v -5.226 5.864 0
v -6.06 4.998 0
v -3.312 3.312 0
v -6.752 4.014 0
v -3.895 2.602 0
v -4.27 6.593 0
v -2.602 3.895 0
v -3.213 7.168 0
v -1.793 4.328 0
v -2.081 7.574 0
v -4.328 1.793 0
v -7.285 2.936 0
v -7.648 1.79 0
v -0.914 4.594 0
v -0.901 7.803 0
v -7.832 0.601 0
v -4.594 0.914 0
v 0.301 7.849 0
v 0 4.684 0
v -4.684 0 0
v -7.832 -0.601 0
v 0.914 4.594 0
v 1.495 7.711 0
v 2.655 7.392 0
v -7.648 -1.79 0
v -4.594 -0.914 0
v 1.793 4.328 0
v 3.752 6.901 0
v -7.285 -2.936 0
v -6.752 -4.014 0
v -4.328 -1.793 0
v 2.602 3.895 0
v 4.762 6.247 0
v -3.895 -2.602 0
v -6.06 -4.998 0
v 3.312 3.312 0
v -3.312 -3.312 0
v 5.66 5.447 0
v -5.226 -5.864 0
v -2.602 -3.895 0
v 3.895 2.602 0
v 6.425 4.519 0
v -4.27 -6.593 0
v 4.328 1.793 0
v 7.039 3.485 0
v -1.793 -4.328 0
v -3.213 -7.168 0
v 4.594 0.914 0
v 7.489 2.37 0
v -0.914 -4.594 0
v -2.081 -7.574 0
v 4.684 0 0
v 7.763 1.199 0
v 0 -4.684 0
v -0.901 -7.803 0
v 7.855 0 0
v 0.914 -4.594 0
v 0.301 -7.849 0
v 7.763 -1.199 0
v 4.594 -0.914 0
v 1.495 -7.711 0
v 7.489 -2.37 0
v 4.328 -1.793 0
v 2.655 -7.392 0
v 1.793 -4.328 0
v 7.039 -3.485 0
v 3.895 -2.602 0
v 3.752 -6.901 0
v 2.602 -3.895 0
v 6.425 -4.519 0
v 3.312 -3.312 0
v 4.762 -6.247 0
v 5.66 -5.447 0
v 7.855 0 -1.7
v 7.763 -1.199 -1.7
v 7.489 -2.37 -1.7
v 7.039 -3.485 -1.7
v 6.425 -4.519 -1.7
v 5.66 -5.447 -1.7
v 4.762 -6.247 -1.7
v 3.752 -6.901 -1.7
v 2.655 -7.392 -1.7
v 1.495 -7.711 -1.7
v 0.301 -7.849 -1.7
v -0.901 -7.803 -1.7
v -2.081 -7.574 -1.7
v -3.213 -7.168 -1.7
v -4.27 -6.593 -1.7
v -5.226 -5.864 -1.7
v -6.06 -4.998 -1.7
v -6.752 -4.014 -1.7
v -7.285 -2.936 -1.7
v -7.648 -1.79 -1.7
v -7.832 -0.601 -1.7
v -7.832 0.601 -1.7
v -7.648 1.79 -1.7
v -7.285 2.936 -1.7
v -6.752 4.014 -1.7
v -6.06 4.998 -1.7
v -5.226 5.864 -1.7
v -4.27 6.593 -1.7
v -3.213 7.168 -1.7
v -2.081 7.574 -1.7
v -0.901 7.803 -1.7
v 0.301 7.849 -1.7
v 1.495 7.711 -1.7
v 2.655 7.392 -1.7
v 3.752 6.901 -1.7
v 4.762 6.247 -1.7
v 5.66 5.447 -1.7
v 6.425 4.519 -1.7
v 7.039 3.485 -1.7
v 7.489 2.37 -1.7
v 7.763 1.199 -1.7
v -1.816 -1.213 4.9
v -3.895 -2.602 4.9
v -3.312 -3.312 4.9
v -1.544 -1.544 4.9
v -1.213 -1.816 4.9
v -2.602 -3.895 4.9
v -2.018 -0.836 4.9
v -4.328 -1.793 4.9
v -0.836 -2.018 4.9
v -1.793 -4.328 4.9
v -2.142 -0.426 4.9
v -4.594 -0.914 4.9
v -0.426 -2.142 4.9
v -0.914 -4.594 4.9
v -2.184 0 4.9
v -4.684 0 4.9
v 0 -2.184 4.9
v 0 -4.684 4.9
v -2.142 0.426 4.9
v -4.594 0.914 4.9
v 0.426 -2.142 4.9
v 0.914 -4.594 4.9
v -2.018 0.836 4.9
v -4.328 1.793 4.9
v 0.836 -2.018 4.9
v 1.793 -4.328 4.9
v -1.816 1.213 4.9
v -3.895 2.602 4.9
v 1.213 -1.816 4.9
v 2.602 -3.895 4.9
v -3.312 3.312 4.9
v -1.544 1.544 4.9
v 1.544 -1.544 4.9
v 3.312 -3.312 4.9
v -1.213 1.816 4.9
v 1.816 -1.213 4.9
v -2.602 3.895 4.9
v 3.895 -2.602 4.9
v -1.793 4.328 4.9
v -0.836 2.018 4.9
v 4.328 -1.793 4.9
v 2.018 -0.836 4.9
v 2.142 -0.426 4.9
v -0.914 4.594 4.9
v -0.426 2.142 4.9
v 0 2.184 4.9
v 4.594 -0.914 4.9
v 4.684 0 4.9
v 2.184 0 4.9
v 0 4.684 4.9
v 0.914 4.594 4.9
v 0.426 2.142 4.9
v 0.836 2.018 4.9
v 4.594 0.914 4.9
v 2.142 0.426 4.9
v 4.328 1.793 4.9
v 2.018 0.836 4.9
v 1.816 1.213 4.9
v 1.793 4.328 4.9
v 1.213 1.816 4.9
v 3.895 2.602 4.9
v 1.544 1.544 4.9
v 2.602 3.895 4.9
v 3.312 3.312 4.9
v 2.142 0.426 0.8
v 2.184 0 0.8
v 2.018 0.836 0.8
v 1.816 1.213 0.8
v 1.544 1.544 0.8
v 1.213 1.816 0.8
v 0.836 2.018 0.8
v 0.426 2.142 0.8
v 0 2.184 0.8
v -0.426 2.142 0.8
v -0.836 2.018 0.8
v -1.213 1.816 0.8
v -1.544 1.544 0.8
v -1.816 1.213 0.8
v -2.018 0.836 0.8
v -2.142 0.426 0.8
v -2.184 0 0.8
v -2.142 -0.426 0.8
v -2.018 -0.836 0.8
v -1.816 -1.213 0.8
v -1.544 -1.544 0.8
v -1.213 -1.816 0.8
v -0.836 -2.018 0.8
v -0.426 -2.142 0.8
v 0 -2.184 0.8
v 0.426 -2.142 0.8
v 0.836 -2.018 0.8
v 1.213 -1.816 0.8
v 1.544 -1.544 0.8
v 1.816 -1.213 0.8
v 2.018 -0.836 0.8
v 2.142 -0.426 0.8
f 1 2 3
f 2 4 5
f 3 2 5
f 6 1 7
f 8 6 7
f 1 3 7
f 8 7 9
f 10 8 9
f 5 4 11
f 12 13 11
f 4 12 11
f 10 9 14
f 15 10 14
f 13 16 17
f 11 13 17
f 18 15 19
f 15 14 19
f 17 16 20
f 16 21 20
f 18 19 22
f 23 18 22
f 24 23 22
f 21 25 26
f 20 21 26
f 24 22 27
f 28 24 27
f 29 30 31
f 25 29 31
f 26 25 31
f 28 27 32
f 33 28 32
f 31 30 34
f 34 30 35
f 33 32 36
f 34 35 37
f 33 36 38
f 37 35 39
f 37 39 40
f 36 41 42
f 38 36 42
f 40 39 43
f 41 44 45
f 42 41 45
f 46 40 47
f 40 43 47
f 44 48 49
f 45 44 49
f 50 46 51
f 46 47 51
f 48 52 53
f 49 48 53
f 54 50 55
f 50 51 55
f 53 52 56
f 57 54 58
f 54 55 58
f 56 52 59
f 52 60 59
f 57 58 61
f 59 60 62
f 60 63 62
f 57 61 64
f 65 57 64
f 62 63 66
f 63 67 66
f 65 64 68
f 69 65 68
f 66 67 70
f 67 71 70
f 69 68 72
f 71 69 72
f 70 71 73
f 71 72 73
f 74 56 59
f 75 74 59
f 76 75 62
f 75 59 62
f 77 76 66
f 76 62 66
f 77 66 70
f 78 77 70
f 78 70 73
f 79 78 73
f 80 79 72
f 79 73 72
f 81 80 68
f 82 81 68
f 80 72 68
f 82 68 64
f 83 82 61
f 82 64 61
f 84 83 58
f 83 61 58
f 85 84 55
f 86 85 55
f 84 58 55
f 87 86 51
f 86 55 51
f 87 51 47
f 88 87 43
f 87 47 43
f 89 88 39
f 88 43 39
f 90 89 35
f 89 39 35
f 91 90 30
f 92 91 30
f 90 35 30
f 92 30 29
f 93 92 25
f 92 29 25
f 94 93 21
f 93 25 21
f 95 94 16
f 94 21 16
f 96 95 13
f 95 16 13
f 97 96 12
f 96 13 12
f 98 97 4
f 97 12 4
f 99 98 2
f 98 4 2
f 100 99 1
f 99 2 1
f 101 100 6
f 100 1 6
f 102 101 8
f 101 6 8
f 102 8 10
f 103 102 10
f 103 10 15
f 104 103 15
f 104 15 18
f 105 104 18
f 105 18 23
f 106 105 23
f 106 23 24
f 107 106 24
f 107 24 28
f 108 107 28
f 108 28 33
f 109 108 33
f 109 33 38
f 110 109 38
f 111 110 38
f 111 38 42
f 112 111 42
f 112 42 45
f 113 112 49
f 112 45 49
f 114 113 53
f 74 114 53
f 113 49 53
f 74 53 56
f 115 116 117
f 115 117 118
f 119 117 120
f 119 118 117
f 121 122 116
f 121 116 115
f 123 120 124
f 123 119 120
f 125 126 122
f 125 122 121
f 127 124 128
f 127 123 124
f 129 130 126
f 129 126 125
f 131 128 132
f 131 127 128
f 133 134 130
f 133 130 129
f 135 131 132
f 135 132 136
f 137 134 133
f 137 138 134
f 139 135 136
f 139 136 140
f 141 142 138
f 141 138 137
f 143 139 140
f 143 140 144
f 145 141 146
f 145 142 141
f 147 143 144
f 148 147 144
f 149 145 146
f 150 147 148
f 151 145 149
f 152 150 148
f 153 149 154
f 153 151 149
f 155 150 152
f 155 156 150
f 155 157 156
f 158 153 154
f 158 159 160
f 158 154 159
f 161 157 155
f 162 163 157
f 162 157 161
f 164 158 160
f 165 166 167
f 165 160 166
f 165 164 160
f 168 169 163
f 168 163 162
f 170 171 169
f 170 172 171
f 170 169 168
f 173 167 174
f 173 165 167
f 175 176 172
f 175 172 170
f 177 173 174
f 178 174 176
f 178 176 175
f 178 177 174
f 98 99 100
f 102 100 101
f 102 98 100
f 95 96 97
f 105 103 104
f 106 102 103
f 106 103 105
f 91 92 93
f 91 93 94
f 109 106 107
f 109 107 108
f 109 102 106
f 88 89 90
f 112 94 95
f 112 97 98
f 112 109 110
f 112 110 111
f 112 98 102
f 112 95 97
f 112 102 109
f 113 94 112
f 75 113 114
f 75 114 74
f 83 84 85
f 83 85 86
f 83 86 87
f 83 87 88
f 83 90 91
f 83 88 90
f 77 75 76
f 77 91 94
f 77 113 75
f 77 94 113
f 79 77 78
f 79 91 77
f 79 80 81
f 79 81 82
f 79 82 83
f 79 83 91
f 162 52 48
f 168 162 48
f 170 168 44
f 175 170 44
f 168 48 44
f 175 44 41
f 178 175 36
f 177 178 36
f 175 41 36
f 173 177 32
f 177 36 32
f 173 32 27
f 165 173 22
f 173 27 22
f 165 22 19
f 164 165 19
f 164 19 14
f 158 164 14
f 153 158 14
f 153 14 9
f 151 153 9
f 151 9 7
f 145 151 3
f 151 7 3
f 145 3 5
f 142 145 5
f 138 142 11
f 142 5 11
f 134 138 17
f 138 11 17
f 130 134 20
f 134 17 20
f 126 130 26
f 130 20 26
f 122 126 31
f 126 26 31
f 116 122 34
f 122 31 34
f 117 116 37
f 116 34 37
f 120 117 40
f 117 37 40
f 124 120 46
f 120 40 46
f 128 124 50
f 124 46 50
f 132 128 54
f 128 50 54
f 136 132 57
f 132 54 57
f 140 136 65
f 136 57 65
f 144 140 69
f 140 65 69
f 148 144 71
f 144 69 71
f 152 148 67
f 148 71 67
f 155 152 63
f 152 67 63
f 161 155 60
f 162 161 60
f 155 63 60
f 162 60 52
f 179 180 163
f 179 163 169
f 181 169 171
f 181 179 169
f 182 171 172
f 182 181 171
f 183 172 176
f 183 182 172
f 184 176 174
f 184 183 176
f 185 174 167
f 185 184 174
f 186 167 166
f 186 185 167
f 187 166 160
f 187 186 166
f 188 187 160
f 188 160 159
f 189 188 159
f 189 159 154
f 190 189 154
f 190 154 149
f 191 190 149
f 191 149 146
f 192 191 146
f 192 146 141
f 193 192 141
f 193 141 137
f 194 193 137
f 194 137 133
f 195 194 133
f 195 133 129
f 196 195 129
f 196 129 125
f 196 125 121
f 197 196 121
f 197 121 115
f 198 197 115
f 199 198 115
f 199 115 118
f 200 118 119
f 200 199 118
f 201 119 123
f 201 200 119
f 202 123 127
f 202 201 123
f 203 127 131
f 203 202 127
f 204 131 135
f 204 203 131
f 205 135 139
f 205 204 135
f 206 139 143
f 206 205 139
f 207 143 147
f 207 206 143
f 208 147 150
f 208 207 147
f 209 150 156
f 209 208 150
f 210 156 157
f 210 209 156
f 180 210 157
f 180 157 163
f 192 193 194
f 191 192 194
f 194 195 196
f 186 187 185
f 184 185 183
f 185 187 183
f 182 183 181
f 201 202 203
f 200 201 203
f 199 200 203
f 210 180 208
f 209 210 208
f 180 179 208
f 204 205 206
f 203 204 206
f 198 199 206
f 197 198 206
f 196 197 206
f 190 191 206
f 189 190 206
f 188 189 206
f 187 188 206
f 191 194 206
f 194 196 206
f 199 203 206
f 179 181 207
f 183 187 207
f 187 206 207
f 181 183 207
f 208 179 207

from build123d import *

# Parameters (mm, degrees)
F0_R     = 4.6841242686
F1_DEPTH = 4.9
F2_R     = 7.8548268631
F3_DEPTH = 1.7
F4_T     = 2.5


# Not quite as in the source:
# - a shell that OpenCascade refuses in one call is made with other operations: the cavity is built on its own and cut out


with BuildPart() as f1:
    # F0 (on Top) → F1 (new body)
    with BuildSketch(Plane.XY):
        Circle(F0_R)
    extrude(amount=F1_DEPTH)

    # F2 (on face) → F3 (join)
    with BuildSketch(Plane(origin=(0, 0, 0), x_dir=(1, 0, 0), z_dir=(0, 0, -1))):
        Circle(F2_R)
    extrude(amount=F3_DEPTH)

    # F4: shell of thickness 2.5, made by hand


with BuildPart() as f4_core1:
    # F4_t2: copy of F1
    add(f1.part)

    # the walls: a layer under each face that stays
    f4_faces = [f4_core1.faces().sort_by_distance(p)[0] for p in [
        (-7.8548268631, 0, -0.85),
        (0, 0, -1.7),
        (-4.6841242686, 0, 2.45),
    ]]
    thicken(f4_faces, amount=-F4_T, mode=Mode.SUBTRACT)


with BuildPart() as f1_1:
    add(f1.part)

    # what is left inside the walls is the cavity
    f4_cavity = [f4_core1.part.solids().sort_by_distance(p)[0] for p in [
        (-2.159124, 0, 3.533333),
    ]]
    add(f4_cavity, mode=Mode.SUBTRACT)


solid = f1_1.part
